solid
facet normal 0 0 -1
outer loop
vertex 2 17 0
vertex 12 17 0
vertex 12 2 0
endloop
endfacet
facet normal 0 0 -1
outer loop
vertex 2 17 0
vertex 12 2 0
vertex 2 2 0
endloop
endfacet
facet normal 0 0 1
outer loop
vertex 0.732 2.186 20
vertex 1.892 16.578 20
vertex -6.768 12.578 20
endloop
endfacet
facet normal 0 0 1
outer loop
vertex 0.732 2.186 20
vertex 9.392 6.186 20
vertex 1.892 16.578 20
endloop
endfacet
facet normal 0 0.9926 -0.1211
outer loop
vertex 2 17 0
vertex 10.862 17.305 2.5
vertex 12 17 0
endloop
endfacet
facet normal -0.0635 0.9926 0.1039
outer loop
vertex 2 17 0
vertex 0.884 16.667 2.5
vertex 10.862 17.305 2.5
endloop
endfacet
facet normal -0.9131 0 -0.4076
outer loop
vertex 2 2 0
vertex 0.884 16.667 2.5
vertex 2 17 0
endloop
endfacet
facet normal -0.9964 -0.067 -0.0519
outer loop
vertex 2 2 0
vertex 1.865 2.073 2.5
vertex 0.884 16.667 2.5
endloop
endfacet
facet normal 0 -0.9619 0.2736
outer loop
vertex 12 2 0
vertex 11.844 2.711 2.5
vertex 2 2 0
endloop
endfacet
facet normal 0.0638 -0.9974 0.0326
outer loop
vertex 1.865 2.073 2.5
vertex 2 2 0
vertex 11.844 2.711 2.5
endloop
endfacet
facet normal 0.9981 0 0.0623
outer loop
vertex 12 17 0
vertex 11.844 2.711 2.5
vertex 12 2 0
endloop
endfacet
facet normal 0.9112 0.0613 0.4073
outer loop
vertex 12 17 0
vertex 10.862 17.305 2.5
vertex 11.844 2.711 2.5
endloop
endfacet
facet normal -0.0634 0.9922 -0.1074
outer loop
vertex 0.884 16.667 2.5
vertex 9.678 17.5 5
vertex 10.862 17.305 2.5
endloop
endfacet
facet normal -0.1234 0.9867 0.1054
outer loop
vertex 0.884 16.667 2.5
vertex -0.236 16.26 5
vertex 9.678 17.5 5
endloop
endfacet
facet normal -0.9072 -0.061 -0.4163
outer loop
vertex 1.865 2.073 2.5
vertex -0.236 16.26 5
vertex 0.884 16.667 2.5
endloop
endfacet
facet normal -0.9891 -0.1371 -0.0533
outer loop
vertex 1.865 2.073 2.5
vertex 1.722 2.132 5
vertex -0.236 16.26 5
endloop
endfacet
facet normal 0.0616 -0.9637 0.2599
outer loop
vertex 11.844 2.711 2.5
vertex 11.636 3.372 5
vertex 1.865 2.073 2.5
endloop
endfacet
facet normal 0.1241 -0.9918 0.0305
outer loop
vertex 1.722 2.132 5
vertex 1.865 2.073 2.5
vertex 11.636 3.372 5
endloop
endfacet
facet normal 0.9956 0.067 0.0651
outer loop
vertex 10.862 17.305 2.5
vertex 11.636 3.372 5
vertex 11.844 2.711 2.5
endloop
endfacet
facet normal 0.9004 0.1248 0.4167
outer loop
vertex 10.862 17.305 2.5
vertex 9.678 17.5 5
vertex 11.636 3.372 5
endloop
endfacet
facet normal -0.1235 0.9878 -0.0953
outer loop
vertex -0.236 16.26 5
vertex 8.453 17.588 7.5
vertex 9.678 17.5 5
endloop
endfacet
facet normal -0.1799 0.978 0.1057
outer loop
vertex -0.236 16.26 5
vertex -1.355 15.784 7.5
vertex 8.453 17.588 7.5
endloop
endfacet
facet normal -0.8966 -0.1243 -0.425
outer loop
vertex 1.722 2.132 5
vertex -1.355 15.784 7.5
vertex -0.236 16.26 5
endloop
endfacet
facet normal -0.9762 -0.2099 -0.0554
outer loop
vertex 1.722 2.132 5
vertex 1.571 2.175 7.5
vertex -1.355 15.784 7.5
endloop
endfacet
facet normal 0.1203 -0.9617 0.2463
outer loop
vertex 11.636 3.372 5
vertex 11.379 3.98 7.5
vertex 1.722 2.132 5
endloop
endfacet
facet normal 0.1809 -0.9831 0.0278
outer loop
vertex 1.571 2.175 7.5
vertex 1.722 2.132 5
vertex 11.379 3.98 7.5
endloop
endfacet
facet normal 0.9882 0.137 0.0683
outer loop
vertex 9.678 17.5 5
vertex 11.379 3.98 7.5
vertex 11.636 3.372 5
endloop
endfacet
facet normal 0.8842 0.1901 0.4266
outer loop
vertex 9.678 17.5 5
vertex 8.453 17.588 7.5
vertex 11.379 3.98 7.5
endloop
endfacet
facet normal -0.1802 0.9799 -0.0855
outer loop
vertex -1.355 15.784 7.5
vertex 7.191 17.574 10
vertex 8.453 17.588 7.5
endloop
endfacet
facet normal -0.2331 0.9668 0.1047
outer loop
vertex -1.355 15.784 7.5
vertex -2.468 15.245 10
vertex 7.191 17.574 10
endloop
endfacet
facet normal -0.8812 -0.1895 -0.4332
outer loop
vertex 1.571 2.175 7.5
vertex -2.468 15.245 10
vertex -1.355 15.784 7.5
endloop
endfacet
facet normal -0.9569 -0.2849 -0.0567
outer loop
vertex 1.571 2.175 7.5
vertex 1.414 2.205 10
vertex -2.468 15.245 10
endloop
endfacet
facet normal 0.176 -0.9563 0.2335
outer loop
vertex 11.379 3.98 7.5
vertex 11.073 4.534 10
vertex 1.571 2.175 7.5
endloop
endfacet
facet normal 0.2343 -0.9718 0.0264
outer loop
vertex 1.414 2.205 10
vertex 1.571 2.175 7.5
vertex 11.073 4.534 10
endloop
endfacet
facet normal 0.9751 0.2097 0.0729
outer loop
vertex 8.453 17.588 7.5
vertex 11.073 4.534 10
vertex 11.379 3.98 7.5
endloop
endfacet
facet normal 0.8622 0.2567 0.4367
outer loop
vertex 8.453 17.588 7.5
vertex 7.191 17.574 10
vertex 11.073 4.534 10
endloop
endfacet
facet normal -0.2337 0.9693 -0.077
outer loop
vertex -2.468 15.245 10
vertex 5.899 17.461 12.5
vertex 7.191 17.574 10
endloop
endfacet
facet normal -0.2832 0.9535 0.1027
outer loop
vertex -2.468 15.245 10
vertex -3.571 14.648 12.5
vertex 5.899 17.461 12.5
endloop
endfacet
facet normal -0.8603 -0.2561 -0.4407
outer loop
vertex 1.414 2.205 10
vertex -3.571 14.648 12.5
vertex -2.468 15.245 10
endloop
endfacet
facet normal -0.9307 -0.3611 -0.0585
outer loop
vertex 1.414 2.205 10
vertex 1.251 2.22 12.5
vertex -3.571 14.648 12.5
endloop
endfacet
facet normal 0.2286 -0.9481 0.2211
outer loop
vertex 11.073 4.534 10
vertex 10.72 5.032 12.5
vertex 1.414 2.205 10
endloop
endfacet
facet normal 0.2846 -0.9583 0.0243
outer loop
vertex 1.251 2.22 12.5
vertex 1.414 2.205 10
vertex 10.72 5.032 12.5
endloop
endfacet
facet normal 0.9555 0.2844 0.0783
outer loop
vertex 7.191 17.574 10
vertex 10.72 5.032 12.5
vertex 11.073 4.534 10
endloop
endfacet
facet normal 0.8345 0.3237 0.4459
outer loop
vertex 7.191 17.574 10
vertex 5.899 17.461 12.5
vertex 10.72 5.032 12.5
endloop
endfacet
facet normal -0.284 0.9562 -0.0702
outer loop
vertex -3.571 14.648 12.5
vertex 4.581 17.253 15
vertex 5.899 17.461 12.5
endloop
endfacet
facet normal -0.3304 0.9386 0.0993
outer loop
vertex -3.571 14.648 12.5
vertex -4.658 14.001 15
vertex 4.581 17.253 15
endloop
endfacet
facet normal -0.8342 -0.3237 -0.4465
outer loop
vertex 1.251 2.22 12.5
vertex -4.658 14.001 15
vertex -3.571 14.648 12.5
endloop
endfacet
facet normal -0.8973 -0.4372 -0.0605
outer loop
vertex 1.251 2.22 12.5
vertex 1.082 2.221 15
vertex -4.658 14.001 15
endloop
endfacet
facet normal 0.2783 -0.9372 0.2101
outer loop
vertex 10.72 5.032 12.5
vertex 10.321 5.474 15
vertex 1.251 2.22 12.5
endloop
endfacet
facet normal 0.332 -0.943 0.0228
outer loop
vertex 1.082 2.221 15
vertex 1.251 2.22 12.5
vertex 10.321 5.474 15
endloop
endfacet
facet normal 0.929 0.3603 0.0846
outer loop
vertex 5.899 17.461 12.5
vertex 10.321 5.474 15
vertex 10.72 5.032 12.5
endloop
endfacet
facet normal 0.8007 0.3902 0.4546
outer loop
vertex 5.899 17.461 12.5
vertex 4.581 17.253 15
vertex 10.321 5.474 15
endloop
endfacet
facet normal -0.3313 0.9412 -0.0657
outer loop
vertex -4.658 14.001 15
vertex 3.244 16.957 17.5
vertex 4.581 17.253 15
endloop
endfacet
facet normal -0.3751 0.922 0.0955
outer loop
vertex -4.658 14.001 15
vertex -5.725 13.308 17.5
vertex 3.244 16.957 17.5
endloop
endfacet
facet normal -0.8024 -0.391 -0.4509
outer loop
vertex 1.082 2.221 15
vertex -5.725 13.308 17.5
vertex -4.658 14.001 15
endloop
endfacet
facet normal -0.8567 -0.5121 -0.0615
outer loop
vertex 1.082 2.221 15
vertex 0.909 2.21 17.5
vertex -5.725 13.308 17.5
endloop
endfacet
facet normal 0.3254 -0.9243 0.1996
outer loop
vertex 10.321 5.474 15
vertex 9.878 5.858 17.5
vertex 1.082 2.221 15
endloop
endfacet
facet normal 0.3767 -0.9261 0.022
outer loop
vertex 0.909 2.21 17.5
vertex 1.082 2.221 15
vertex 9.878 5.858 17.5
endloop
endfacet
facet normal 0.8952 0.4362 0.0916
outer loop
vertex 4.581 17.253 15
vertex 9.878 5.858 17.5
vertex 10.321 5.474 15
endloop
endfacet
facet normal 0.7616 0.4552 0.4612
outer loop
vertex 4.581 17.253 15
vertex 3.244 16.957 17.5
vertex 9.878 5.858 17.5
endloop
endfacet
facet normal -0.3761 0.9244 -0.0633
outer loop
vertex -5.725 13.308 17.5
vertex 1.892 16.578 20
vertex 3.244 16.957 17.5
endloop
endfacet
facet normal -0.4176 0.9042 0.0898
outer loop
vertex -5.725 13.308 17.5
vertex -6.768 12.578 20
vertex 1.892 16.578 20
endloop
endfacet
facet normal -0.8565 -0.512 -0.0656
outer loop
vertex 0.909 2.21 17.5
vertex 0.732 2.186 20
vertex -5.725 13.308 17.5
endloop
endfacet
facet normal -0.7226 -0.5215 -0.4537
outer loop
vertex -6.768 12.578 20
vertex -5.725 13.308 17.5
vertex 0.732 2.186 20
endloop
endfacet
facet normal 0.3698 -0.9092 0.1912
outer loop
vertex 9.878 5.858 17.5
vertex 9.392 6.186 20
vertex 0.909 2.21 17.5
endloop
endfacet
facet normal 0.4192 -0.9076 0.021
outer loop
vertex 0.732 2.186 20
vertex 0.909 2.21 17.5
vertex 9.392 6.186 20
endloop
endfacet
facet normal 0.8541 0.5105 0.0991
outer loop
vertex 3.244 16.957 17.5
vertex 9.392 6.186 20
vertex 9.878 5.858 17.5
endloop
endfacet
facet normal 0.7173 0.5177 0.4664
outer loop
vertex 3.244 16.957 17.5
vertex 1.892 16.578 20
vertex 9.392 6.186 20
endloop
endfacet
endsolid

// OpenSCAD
linear_extrude(height=20, scale=[1,.8], twist=-30, slices=8) {
    translate([2,2,0]) {
        polygon(
            points=[
               [0,0],
               [10,0],
               [10,15],
               [0,15]],
            paths=[
               [0, 1, 2, 3],
            ]
        );
    }
}
